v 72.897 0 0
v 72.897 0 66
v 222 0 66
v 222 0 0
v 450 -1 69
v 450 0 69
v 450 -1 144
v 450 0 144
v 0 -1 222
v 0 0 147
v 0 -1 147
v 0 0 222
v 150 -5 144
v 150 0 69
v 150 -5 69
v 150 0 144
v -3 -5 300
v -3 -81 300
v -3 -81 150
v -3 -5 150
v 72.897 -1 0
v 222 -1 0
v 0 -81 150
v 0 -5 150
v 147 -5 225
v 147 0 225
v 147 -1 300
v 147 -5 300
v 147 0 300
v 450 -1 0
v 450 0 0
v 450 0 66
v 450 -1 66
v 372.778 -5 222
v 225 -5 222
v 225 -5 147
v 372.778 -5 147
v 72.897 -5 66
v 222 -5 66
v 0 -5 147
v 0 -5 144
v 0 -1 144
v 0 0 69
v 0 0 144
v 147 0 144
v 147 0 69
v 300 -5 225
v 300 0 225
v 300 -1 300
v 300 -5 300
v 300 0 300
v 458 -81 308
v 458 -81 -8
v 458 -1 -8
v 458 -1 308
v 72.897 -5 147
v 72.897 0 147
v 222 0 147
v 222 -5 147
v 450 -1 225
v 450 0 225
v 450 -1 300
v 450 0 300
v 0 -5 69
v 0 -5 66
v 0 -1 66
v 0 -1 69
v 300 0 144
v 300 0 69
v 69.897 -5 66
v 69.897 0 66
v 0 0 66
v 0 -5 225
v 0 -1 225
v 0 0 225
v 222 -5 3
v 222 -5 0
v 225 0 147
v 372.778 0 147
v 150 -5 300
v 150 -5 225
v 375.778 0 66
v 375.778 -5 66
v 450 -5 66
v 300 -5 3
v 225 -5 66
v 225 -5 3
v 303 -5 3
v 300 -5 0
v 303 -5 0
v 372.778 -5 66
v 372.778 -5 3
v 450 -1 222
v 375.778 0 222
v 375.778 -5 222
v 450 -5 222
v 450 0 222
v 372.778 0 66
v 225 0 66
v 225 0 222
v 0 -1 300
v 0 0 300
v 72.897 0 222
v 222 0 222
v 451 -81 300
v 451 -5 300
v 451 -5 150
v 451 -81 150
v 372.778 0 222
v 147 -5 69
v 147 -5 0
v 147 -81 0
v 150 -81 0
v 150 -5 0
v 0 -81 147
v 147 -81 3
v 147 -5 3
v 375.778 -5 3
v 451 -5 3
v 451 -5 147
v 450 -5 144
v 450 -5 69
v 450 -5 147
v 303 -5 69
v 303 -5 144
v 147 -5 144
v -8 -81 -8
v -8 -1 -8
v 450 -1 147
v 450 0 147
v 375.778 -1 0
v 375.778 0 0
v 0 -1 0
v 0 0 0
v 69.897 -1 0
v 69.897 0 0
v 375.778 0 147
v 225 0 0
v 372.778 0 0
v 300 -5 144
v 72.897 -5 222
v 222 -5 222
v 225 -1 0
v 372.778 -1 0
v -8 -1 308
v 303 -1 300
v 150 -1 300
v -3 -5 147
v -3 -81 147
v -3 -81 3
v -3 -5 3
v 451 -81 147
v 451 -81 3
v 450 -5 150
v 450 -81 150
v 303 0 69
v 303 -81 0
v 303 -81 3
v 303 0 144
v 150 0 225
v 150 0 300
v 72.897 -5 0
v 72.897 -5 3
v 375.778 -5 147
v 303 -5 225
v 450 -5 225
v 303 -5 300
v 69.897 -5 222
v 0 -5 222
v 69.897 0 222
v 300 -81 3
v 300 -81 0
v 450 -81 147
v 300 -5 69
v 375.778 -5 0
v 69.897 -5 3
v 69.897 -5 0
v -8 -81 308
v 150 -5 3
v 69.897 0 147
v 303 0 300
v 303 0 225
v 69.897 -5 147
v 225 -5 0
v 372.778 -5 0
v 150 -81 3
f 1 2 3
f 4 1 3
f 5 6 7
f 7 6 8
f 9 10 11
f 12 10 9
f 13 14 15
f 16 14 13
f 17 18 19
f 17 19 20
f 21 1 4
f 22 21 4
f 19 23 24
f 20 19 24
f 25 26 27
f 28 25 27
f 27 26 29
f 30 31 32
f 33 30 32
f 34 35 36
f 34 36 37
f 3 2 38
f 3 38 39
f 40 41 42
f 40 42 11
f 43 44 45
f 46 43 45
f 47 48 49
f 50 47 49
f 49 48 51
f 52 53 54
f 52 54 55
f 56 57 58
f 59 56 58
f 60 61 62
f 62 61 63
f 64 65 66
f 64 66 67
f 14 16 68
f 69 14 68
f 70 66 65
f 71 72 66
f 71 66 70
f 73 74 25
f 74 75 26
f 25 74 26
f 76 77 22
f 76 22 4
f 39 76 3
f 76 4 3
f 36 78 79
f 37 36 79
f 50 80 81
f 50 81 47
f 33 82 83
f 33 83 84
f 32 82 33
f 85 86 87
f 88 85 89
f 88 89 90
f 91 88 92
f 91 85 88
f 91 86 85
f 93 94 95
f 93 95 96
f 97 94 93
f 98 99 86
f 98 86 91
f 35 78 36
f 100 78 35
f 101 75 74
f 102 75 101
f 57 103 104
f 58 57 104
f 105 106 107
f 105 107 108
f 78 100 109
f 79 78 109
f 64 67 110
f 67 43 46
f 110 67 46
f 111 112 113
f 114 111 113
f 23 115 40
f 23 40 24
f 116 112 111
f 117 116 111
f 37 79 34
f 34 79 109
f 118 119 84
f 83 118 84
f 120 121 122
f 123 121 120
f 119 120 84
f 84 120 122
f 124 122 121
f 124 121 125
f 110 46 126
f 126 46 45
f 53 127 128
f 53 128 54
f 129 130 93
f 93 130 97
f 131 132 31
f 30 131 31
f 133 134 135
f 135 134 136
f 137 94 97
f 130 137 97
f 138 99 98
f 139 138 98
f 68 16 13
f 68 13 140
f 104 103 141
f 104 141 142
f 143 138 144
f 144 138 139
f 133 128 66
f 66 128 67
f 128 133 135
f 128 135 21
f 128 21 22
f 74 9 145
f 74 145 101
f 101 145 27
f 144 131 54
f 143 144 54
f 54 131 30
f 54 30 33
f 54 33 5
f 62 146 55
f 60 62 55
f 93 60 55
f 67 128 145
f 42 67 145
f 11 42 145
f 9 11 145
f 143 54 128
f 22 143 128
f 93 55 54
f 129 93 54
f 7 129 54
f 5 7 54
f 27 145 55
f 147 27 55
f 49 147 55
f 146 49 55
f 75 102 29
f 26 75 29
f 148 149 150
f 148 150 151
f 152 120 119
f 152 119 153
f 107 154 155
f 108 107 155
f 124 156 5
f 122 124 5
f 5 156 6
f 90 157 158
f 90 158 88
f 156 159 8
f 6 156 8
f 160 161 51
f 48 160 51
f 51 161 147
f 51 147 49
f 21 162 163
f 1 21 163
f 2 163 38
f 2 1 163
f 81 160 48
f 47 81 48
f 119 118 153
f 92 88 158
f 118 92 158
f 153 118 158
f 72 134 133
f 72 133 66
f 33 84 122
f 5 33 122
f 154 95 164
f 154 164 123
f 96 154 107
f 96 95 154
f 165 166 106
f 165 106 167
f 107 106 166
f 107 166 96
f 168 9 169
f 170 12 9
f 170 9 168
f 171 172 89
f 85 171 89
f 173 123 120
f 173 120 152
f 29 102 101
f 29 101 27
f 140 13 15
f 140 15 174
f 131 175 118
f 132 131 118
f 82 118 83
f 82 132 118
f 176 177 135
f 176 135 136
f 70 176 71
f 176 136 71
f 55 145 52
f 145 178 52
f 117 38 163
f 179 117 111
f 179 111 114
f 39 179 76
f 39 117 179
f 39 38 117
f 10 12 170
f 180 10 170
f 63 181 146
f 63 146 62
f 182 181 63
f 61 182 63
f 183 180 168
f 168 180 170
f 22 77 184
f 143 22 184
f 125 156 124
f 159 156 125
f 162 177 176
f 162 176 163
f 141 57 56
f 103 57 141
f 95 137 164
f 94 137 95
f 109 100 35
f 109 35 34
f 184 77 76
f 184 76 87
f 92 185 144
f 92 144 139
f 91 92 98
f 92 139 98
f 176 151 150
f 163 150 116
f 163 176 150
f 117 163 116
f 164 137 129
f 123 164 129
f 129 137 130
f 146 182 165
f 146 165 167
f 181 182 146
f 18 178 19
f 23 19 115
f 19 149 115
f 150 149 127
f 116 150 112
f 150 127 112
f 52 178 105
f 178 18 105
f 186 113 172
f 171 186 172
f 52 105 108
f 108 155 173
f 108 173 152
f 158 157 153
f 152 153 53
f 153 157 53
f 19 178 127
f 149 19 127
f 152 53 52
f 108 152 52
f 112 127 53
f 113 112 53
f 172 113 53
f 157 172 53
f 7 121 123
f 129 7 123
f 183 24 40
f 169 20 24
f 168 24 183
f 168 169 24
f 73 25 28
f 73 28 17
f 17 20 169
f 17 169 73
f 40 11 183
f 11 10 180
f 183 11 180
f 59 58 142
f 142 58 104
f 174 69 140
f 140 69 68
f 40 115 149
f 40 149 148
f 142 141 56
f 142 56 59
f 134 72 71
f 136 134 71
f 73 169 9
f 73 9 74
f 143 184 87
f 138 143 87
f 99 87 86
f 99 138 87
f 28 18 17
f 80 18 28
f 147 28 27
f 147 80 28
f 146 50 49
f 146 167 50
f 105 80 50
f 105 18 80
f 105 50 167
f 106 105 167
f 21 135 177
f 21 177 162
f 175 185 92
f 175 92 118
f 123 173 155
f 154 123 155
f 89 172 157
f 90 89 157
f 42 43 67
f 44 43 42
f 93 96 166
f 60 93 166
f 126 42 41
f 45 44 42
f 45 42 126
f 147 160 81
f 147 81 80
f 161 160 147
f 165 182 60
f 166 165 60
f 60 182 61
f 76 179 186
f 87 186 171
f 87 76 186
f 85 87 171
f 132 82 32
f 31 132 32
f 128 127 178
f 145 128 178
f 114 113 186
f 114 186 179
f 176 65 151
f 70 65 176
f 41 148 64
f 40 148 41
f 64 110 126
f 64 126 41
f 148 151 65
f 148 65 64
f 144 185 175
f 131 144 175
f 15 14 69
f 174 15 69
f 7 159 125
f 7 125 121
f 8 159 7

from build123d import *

# Parameters (mm, degrees)
F2_W          = 466
F2_H          = 316
F2_W_2        = 450
F2_H_2        = 300
F3_DEPTH      = 3
F3_DEPTH_BACK = 77
F4_W          = 147
F4_H          = 75
F4_W_2        = 150
F4_W_3        = 69.896846
F4_W_4        = 149.103154
F4_W_5        = 147.778356
F4_W_6        = 74.221644
F4_H_2        = 66
F5_DEPTH      = 5
F6_W          = 147
F6_H          = 76
F6_W_2        = 150
F7_DEPTH      = 3
F8_W          = 76
F8_H          = 150
F8_H_2        = 144
F9_DEPTH      = 3
F10_W         = 76
F10_H         = 150
F10_H_2       = 144
F11_DEPTH     = 1


with BuildPart() as f3:
    # F2 (on offset) → F3 (new body, two sides)
    with BuildSketch(Plane.XZ.offset(78)) as f3_sk:
        with Locations((225, 150)):
            Rectangle(F2_W, F2_H)
        with Locations((225, 150)):
            Rectangle(F2_W_2, F2_H_2, mode=Mode.SUBTRACT)
    extrude(amount=F3_DEPTH)
    extrude(f3_sk.sketch, amount=-F3_DEPTH_BACK)

    # F4 (on Front) → F5 (join)
    with BuildSketch(Plane.XZ):
        with Locations((73.5, 262.5)):
            Rectangle(F4_W, F4_H)
        with Locations((225, 262.5)):
            Rectangle(F4_W_2, F4_H)
        with Locations((376.5, 262.5)):
            Rectangle(F4_W, F4_H)
        with Locations((34.948423, 184.5)):
            Rectangle(F4_W_3, F4_H)
        with Locations((147.448423, 184.5)):
            Rectangle(F4_W_4, F4_H)
        with Locations((298.889178, 184.5)):
            Rectangle(F4_W_5, F4_H)
        with Locations((412.889178, 184.5)):
            Rectangle(F4_W_6, F4_H)
        with Locations((376.5, 106.5)):
            Rectangle(F4_W, F4_H)
        with Locations((225, 106.5)):
            Rectangle(F4_W_2, F4_H)
        with Locations((73.5, 106.5)):
            Rectangle(F4_W, F4_H)
        with Locations((147.448423, 33)):
            Rectangle(F4_W_4, F4_H_2)
        with Locations((34.948423, 33)):
            Rectangle(F4_W_3, F4_H_2)
        with Locations((298.889178, 33)):
            Rectangle(F4_W_5, F4_H_2)
        with Locations((412.889178, 33)):
            Rectangle(F4_W_6, F4_H_2)
    extrude(amount=F5_DEPTH)

    # F6 (on face) → F7 (join)
    with BuildSketch(Plane.XY):
        with Locations((73.5, -43)):
            Rectangle(F6_W, F6_H)
        with Locations((225, -43)):
            Rectangle(F6_W_2, F6_H)
        with Locations((376.5, -43)):
            Rectangle(F6_W, F6_H)
    extrude(amount=F7_DEPTH)

    # F8 (on face) → F9 (cut)
    with BuildSketch(Plane.YZ):
        with Locations((-43, 225)):
            Rectangle(F8_W, F8_H)
        with Locations((-43, 75)):
            Rectangle(F8_W, F8_H_2)
    extrude(amount=-F9_DEPTH, mode=Mode.SUBTRACT)

    # F10 (on face) → F11 (cut)
    with BuildSketch(Plane(origin=(450, 0, 0), x_dir=(0, -1, 0), z_dir=(-1, 0, 0))):
        with Locations((43, 225)):
            Rectangle(F10_W, F10_H)
        with Locations((43, 75)):
            Rectangle(F10_W, F10_H_2)
    extrude(amount=-F11_DEPTH, mode=Mode.SUBTRACT)


solid = f3.part
